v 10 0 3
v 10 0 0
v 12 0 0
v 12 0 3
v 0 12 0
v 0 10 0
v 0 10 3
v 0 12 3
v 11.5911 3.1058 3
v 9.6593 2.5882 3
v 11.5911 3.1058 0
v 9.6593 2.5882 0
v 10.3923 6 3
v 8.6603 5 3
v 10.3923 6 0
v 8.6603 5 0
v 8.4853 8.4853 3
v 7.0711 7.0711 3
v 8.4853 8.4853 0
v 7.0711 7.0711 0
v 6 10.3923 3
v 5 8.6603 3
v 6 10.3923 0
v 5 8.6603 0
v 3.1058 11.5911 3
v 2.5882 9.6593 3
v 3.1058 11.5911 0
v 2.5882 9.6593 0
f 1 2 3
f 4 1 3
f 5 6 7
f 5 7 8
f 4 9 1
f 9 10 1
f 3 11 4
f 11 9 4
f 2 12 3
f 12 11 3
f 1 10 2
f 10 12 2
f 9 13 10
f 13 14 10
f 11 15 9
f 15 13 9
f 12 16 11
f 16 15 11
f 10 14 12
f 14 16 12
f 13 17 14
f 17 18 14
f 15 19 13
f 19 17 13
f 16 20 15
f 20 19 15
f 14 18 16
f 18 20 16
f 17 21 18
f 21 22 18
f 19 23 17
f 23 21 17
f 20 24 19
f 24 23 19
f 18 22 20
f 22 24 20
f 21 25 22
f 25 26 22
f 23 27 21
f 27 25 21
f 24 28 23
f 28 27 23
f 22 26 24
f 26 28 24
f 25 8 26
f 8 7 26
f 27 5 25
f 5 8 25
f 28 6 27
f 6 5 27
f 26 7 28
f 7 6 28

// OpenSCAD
// oracle: tris
rotate_extrude(angle=90, $fn=24)
    translate([10, 0]) square([2, 3]);
